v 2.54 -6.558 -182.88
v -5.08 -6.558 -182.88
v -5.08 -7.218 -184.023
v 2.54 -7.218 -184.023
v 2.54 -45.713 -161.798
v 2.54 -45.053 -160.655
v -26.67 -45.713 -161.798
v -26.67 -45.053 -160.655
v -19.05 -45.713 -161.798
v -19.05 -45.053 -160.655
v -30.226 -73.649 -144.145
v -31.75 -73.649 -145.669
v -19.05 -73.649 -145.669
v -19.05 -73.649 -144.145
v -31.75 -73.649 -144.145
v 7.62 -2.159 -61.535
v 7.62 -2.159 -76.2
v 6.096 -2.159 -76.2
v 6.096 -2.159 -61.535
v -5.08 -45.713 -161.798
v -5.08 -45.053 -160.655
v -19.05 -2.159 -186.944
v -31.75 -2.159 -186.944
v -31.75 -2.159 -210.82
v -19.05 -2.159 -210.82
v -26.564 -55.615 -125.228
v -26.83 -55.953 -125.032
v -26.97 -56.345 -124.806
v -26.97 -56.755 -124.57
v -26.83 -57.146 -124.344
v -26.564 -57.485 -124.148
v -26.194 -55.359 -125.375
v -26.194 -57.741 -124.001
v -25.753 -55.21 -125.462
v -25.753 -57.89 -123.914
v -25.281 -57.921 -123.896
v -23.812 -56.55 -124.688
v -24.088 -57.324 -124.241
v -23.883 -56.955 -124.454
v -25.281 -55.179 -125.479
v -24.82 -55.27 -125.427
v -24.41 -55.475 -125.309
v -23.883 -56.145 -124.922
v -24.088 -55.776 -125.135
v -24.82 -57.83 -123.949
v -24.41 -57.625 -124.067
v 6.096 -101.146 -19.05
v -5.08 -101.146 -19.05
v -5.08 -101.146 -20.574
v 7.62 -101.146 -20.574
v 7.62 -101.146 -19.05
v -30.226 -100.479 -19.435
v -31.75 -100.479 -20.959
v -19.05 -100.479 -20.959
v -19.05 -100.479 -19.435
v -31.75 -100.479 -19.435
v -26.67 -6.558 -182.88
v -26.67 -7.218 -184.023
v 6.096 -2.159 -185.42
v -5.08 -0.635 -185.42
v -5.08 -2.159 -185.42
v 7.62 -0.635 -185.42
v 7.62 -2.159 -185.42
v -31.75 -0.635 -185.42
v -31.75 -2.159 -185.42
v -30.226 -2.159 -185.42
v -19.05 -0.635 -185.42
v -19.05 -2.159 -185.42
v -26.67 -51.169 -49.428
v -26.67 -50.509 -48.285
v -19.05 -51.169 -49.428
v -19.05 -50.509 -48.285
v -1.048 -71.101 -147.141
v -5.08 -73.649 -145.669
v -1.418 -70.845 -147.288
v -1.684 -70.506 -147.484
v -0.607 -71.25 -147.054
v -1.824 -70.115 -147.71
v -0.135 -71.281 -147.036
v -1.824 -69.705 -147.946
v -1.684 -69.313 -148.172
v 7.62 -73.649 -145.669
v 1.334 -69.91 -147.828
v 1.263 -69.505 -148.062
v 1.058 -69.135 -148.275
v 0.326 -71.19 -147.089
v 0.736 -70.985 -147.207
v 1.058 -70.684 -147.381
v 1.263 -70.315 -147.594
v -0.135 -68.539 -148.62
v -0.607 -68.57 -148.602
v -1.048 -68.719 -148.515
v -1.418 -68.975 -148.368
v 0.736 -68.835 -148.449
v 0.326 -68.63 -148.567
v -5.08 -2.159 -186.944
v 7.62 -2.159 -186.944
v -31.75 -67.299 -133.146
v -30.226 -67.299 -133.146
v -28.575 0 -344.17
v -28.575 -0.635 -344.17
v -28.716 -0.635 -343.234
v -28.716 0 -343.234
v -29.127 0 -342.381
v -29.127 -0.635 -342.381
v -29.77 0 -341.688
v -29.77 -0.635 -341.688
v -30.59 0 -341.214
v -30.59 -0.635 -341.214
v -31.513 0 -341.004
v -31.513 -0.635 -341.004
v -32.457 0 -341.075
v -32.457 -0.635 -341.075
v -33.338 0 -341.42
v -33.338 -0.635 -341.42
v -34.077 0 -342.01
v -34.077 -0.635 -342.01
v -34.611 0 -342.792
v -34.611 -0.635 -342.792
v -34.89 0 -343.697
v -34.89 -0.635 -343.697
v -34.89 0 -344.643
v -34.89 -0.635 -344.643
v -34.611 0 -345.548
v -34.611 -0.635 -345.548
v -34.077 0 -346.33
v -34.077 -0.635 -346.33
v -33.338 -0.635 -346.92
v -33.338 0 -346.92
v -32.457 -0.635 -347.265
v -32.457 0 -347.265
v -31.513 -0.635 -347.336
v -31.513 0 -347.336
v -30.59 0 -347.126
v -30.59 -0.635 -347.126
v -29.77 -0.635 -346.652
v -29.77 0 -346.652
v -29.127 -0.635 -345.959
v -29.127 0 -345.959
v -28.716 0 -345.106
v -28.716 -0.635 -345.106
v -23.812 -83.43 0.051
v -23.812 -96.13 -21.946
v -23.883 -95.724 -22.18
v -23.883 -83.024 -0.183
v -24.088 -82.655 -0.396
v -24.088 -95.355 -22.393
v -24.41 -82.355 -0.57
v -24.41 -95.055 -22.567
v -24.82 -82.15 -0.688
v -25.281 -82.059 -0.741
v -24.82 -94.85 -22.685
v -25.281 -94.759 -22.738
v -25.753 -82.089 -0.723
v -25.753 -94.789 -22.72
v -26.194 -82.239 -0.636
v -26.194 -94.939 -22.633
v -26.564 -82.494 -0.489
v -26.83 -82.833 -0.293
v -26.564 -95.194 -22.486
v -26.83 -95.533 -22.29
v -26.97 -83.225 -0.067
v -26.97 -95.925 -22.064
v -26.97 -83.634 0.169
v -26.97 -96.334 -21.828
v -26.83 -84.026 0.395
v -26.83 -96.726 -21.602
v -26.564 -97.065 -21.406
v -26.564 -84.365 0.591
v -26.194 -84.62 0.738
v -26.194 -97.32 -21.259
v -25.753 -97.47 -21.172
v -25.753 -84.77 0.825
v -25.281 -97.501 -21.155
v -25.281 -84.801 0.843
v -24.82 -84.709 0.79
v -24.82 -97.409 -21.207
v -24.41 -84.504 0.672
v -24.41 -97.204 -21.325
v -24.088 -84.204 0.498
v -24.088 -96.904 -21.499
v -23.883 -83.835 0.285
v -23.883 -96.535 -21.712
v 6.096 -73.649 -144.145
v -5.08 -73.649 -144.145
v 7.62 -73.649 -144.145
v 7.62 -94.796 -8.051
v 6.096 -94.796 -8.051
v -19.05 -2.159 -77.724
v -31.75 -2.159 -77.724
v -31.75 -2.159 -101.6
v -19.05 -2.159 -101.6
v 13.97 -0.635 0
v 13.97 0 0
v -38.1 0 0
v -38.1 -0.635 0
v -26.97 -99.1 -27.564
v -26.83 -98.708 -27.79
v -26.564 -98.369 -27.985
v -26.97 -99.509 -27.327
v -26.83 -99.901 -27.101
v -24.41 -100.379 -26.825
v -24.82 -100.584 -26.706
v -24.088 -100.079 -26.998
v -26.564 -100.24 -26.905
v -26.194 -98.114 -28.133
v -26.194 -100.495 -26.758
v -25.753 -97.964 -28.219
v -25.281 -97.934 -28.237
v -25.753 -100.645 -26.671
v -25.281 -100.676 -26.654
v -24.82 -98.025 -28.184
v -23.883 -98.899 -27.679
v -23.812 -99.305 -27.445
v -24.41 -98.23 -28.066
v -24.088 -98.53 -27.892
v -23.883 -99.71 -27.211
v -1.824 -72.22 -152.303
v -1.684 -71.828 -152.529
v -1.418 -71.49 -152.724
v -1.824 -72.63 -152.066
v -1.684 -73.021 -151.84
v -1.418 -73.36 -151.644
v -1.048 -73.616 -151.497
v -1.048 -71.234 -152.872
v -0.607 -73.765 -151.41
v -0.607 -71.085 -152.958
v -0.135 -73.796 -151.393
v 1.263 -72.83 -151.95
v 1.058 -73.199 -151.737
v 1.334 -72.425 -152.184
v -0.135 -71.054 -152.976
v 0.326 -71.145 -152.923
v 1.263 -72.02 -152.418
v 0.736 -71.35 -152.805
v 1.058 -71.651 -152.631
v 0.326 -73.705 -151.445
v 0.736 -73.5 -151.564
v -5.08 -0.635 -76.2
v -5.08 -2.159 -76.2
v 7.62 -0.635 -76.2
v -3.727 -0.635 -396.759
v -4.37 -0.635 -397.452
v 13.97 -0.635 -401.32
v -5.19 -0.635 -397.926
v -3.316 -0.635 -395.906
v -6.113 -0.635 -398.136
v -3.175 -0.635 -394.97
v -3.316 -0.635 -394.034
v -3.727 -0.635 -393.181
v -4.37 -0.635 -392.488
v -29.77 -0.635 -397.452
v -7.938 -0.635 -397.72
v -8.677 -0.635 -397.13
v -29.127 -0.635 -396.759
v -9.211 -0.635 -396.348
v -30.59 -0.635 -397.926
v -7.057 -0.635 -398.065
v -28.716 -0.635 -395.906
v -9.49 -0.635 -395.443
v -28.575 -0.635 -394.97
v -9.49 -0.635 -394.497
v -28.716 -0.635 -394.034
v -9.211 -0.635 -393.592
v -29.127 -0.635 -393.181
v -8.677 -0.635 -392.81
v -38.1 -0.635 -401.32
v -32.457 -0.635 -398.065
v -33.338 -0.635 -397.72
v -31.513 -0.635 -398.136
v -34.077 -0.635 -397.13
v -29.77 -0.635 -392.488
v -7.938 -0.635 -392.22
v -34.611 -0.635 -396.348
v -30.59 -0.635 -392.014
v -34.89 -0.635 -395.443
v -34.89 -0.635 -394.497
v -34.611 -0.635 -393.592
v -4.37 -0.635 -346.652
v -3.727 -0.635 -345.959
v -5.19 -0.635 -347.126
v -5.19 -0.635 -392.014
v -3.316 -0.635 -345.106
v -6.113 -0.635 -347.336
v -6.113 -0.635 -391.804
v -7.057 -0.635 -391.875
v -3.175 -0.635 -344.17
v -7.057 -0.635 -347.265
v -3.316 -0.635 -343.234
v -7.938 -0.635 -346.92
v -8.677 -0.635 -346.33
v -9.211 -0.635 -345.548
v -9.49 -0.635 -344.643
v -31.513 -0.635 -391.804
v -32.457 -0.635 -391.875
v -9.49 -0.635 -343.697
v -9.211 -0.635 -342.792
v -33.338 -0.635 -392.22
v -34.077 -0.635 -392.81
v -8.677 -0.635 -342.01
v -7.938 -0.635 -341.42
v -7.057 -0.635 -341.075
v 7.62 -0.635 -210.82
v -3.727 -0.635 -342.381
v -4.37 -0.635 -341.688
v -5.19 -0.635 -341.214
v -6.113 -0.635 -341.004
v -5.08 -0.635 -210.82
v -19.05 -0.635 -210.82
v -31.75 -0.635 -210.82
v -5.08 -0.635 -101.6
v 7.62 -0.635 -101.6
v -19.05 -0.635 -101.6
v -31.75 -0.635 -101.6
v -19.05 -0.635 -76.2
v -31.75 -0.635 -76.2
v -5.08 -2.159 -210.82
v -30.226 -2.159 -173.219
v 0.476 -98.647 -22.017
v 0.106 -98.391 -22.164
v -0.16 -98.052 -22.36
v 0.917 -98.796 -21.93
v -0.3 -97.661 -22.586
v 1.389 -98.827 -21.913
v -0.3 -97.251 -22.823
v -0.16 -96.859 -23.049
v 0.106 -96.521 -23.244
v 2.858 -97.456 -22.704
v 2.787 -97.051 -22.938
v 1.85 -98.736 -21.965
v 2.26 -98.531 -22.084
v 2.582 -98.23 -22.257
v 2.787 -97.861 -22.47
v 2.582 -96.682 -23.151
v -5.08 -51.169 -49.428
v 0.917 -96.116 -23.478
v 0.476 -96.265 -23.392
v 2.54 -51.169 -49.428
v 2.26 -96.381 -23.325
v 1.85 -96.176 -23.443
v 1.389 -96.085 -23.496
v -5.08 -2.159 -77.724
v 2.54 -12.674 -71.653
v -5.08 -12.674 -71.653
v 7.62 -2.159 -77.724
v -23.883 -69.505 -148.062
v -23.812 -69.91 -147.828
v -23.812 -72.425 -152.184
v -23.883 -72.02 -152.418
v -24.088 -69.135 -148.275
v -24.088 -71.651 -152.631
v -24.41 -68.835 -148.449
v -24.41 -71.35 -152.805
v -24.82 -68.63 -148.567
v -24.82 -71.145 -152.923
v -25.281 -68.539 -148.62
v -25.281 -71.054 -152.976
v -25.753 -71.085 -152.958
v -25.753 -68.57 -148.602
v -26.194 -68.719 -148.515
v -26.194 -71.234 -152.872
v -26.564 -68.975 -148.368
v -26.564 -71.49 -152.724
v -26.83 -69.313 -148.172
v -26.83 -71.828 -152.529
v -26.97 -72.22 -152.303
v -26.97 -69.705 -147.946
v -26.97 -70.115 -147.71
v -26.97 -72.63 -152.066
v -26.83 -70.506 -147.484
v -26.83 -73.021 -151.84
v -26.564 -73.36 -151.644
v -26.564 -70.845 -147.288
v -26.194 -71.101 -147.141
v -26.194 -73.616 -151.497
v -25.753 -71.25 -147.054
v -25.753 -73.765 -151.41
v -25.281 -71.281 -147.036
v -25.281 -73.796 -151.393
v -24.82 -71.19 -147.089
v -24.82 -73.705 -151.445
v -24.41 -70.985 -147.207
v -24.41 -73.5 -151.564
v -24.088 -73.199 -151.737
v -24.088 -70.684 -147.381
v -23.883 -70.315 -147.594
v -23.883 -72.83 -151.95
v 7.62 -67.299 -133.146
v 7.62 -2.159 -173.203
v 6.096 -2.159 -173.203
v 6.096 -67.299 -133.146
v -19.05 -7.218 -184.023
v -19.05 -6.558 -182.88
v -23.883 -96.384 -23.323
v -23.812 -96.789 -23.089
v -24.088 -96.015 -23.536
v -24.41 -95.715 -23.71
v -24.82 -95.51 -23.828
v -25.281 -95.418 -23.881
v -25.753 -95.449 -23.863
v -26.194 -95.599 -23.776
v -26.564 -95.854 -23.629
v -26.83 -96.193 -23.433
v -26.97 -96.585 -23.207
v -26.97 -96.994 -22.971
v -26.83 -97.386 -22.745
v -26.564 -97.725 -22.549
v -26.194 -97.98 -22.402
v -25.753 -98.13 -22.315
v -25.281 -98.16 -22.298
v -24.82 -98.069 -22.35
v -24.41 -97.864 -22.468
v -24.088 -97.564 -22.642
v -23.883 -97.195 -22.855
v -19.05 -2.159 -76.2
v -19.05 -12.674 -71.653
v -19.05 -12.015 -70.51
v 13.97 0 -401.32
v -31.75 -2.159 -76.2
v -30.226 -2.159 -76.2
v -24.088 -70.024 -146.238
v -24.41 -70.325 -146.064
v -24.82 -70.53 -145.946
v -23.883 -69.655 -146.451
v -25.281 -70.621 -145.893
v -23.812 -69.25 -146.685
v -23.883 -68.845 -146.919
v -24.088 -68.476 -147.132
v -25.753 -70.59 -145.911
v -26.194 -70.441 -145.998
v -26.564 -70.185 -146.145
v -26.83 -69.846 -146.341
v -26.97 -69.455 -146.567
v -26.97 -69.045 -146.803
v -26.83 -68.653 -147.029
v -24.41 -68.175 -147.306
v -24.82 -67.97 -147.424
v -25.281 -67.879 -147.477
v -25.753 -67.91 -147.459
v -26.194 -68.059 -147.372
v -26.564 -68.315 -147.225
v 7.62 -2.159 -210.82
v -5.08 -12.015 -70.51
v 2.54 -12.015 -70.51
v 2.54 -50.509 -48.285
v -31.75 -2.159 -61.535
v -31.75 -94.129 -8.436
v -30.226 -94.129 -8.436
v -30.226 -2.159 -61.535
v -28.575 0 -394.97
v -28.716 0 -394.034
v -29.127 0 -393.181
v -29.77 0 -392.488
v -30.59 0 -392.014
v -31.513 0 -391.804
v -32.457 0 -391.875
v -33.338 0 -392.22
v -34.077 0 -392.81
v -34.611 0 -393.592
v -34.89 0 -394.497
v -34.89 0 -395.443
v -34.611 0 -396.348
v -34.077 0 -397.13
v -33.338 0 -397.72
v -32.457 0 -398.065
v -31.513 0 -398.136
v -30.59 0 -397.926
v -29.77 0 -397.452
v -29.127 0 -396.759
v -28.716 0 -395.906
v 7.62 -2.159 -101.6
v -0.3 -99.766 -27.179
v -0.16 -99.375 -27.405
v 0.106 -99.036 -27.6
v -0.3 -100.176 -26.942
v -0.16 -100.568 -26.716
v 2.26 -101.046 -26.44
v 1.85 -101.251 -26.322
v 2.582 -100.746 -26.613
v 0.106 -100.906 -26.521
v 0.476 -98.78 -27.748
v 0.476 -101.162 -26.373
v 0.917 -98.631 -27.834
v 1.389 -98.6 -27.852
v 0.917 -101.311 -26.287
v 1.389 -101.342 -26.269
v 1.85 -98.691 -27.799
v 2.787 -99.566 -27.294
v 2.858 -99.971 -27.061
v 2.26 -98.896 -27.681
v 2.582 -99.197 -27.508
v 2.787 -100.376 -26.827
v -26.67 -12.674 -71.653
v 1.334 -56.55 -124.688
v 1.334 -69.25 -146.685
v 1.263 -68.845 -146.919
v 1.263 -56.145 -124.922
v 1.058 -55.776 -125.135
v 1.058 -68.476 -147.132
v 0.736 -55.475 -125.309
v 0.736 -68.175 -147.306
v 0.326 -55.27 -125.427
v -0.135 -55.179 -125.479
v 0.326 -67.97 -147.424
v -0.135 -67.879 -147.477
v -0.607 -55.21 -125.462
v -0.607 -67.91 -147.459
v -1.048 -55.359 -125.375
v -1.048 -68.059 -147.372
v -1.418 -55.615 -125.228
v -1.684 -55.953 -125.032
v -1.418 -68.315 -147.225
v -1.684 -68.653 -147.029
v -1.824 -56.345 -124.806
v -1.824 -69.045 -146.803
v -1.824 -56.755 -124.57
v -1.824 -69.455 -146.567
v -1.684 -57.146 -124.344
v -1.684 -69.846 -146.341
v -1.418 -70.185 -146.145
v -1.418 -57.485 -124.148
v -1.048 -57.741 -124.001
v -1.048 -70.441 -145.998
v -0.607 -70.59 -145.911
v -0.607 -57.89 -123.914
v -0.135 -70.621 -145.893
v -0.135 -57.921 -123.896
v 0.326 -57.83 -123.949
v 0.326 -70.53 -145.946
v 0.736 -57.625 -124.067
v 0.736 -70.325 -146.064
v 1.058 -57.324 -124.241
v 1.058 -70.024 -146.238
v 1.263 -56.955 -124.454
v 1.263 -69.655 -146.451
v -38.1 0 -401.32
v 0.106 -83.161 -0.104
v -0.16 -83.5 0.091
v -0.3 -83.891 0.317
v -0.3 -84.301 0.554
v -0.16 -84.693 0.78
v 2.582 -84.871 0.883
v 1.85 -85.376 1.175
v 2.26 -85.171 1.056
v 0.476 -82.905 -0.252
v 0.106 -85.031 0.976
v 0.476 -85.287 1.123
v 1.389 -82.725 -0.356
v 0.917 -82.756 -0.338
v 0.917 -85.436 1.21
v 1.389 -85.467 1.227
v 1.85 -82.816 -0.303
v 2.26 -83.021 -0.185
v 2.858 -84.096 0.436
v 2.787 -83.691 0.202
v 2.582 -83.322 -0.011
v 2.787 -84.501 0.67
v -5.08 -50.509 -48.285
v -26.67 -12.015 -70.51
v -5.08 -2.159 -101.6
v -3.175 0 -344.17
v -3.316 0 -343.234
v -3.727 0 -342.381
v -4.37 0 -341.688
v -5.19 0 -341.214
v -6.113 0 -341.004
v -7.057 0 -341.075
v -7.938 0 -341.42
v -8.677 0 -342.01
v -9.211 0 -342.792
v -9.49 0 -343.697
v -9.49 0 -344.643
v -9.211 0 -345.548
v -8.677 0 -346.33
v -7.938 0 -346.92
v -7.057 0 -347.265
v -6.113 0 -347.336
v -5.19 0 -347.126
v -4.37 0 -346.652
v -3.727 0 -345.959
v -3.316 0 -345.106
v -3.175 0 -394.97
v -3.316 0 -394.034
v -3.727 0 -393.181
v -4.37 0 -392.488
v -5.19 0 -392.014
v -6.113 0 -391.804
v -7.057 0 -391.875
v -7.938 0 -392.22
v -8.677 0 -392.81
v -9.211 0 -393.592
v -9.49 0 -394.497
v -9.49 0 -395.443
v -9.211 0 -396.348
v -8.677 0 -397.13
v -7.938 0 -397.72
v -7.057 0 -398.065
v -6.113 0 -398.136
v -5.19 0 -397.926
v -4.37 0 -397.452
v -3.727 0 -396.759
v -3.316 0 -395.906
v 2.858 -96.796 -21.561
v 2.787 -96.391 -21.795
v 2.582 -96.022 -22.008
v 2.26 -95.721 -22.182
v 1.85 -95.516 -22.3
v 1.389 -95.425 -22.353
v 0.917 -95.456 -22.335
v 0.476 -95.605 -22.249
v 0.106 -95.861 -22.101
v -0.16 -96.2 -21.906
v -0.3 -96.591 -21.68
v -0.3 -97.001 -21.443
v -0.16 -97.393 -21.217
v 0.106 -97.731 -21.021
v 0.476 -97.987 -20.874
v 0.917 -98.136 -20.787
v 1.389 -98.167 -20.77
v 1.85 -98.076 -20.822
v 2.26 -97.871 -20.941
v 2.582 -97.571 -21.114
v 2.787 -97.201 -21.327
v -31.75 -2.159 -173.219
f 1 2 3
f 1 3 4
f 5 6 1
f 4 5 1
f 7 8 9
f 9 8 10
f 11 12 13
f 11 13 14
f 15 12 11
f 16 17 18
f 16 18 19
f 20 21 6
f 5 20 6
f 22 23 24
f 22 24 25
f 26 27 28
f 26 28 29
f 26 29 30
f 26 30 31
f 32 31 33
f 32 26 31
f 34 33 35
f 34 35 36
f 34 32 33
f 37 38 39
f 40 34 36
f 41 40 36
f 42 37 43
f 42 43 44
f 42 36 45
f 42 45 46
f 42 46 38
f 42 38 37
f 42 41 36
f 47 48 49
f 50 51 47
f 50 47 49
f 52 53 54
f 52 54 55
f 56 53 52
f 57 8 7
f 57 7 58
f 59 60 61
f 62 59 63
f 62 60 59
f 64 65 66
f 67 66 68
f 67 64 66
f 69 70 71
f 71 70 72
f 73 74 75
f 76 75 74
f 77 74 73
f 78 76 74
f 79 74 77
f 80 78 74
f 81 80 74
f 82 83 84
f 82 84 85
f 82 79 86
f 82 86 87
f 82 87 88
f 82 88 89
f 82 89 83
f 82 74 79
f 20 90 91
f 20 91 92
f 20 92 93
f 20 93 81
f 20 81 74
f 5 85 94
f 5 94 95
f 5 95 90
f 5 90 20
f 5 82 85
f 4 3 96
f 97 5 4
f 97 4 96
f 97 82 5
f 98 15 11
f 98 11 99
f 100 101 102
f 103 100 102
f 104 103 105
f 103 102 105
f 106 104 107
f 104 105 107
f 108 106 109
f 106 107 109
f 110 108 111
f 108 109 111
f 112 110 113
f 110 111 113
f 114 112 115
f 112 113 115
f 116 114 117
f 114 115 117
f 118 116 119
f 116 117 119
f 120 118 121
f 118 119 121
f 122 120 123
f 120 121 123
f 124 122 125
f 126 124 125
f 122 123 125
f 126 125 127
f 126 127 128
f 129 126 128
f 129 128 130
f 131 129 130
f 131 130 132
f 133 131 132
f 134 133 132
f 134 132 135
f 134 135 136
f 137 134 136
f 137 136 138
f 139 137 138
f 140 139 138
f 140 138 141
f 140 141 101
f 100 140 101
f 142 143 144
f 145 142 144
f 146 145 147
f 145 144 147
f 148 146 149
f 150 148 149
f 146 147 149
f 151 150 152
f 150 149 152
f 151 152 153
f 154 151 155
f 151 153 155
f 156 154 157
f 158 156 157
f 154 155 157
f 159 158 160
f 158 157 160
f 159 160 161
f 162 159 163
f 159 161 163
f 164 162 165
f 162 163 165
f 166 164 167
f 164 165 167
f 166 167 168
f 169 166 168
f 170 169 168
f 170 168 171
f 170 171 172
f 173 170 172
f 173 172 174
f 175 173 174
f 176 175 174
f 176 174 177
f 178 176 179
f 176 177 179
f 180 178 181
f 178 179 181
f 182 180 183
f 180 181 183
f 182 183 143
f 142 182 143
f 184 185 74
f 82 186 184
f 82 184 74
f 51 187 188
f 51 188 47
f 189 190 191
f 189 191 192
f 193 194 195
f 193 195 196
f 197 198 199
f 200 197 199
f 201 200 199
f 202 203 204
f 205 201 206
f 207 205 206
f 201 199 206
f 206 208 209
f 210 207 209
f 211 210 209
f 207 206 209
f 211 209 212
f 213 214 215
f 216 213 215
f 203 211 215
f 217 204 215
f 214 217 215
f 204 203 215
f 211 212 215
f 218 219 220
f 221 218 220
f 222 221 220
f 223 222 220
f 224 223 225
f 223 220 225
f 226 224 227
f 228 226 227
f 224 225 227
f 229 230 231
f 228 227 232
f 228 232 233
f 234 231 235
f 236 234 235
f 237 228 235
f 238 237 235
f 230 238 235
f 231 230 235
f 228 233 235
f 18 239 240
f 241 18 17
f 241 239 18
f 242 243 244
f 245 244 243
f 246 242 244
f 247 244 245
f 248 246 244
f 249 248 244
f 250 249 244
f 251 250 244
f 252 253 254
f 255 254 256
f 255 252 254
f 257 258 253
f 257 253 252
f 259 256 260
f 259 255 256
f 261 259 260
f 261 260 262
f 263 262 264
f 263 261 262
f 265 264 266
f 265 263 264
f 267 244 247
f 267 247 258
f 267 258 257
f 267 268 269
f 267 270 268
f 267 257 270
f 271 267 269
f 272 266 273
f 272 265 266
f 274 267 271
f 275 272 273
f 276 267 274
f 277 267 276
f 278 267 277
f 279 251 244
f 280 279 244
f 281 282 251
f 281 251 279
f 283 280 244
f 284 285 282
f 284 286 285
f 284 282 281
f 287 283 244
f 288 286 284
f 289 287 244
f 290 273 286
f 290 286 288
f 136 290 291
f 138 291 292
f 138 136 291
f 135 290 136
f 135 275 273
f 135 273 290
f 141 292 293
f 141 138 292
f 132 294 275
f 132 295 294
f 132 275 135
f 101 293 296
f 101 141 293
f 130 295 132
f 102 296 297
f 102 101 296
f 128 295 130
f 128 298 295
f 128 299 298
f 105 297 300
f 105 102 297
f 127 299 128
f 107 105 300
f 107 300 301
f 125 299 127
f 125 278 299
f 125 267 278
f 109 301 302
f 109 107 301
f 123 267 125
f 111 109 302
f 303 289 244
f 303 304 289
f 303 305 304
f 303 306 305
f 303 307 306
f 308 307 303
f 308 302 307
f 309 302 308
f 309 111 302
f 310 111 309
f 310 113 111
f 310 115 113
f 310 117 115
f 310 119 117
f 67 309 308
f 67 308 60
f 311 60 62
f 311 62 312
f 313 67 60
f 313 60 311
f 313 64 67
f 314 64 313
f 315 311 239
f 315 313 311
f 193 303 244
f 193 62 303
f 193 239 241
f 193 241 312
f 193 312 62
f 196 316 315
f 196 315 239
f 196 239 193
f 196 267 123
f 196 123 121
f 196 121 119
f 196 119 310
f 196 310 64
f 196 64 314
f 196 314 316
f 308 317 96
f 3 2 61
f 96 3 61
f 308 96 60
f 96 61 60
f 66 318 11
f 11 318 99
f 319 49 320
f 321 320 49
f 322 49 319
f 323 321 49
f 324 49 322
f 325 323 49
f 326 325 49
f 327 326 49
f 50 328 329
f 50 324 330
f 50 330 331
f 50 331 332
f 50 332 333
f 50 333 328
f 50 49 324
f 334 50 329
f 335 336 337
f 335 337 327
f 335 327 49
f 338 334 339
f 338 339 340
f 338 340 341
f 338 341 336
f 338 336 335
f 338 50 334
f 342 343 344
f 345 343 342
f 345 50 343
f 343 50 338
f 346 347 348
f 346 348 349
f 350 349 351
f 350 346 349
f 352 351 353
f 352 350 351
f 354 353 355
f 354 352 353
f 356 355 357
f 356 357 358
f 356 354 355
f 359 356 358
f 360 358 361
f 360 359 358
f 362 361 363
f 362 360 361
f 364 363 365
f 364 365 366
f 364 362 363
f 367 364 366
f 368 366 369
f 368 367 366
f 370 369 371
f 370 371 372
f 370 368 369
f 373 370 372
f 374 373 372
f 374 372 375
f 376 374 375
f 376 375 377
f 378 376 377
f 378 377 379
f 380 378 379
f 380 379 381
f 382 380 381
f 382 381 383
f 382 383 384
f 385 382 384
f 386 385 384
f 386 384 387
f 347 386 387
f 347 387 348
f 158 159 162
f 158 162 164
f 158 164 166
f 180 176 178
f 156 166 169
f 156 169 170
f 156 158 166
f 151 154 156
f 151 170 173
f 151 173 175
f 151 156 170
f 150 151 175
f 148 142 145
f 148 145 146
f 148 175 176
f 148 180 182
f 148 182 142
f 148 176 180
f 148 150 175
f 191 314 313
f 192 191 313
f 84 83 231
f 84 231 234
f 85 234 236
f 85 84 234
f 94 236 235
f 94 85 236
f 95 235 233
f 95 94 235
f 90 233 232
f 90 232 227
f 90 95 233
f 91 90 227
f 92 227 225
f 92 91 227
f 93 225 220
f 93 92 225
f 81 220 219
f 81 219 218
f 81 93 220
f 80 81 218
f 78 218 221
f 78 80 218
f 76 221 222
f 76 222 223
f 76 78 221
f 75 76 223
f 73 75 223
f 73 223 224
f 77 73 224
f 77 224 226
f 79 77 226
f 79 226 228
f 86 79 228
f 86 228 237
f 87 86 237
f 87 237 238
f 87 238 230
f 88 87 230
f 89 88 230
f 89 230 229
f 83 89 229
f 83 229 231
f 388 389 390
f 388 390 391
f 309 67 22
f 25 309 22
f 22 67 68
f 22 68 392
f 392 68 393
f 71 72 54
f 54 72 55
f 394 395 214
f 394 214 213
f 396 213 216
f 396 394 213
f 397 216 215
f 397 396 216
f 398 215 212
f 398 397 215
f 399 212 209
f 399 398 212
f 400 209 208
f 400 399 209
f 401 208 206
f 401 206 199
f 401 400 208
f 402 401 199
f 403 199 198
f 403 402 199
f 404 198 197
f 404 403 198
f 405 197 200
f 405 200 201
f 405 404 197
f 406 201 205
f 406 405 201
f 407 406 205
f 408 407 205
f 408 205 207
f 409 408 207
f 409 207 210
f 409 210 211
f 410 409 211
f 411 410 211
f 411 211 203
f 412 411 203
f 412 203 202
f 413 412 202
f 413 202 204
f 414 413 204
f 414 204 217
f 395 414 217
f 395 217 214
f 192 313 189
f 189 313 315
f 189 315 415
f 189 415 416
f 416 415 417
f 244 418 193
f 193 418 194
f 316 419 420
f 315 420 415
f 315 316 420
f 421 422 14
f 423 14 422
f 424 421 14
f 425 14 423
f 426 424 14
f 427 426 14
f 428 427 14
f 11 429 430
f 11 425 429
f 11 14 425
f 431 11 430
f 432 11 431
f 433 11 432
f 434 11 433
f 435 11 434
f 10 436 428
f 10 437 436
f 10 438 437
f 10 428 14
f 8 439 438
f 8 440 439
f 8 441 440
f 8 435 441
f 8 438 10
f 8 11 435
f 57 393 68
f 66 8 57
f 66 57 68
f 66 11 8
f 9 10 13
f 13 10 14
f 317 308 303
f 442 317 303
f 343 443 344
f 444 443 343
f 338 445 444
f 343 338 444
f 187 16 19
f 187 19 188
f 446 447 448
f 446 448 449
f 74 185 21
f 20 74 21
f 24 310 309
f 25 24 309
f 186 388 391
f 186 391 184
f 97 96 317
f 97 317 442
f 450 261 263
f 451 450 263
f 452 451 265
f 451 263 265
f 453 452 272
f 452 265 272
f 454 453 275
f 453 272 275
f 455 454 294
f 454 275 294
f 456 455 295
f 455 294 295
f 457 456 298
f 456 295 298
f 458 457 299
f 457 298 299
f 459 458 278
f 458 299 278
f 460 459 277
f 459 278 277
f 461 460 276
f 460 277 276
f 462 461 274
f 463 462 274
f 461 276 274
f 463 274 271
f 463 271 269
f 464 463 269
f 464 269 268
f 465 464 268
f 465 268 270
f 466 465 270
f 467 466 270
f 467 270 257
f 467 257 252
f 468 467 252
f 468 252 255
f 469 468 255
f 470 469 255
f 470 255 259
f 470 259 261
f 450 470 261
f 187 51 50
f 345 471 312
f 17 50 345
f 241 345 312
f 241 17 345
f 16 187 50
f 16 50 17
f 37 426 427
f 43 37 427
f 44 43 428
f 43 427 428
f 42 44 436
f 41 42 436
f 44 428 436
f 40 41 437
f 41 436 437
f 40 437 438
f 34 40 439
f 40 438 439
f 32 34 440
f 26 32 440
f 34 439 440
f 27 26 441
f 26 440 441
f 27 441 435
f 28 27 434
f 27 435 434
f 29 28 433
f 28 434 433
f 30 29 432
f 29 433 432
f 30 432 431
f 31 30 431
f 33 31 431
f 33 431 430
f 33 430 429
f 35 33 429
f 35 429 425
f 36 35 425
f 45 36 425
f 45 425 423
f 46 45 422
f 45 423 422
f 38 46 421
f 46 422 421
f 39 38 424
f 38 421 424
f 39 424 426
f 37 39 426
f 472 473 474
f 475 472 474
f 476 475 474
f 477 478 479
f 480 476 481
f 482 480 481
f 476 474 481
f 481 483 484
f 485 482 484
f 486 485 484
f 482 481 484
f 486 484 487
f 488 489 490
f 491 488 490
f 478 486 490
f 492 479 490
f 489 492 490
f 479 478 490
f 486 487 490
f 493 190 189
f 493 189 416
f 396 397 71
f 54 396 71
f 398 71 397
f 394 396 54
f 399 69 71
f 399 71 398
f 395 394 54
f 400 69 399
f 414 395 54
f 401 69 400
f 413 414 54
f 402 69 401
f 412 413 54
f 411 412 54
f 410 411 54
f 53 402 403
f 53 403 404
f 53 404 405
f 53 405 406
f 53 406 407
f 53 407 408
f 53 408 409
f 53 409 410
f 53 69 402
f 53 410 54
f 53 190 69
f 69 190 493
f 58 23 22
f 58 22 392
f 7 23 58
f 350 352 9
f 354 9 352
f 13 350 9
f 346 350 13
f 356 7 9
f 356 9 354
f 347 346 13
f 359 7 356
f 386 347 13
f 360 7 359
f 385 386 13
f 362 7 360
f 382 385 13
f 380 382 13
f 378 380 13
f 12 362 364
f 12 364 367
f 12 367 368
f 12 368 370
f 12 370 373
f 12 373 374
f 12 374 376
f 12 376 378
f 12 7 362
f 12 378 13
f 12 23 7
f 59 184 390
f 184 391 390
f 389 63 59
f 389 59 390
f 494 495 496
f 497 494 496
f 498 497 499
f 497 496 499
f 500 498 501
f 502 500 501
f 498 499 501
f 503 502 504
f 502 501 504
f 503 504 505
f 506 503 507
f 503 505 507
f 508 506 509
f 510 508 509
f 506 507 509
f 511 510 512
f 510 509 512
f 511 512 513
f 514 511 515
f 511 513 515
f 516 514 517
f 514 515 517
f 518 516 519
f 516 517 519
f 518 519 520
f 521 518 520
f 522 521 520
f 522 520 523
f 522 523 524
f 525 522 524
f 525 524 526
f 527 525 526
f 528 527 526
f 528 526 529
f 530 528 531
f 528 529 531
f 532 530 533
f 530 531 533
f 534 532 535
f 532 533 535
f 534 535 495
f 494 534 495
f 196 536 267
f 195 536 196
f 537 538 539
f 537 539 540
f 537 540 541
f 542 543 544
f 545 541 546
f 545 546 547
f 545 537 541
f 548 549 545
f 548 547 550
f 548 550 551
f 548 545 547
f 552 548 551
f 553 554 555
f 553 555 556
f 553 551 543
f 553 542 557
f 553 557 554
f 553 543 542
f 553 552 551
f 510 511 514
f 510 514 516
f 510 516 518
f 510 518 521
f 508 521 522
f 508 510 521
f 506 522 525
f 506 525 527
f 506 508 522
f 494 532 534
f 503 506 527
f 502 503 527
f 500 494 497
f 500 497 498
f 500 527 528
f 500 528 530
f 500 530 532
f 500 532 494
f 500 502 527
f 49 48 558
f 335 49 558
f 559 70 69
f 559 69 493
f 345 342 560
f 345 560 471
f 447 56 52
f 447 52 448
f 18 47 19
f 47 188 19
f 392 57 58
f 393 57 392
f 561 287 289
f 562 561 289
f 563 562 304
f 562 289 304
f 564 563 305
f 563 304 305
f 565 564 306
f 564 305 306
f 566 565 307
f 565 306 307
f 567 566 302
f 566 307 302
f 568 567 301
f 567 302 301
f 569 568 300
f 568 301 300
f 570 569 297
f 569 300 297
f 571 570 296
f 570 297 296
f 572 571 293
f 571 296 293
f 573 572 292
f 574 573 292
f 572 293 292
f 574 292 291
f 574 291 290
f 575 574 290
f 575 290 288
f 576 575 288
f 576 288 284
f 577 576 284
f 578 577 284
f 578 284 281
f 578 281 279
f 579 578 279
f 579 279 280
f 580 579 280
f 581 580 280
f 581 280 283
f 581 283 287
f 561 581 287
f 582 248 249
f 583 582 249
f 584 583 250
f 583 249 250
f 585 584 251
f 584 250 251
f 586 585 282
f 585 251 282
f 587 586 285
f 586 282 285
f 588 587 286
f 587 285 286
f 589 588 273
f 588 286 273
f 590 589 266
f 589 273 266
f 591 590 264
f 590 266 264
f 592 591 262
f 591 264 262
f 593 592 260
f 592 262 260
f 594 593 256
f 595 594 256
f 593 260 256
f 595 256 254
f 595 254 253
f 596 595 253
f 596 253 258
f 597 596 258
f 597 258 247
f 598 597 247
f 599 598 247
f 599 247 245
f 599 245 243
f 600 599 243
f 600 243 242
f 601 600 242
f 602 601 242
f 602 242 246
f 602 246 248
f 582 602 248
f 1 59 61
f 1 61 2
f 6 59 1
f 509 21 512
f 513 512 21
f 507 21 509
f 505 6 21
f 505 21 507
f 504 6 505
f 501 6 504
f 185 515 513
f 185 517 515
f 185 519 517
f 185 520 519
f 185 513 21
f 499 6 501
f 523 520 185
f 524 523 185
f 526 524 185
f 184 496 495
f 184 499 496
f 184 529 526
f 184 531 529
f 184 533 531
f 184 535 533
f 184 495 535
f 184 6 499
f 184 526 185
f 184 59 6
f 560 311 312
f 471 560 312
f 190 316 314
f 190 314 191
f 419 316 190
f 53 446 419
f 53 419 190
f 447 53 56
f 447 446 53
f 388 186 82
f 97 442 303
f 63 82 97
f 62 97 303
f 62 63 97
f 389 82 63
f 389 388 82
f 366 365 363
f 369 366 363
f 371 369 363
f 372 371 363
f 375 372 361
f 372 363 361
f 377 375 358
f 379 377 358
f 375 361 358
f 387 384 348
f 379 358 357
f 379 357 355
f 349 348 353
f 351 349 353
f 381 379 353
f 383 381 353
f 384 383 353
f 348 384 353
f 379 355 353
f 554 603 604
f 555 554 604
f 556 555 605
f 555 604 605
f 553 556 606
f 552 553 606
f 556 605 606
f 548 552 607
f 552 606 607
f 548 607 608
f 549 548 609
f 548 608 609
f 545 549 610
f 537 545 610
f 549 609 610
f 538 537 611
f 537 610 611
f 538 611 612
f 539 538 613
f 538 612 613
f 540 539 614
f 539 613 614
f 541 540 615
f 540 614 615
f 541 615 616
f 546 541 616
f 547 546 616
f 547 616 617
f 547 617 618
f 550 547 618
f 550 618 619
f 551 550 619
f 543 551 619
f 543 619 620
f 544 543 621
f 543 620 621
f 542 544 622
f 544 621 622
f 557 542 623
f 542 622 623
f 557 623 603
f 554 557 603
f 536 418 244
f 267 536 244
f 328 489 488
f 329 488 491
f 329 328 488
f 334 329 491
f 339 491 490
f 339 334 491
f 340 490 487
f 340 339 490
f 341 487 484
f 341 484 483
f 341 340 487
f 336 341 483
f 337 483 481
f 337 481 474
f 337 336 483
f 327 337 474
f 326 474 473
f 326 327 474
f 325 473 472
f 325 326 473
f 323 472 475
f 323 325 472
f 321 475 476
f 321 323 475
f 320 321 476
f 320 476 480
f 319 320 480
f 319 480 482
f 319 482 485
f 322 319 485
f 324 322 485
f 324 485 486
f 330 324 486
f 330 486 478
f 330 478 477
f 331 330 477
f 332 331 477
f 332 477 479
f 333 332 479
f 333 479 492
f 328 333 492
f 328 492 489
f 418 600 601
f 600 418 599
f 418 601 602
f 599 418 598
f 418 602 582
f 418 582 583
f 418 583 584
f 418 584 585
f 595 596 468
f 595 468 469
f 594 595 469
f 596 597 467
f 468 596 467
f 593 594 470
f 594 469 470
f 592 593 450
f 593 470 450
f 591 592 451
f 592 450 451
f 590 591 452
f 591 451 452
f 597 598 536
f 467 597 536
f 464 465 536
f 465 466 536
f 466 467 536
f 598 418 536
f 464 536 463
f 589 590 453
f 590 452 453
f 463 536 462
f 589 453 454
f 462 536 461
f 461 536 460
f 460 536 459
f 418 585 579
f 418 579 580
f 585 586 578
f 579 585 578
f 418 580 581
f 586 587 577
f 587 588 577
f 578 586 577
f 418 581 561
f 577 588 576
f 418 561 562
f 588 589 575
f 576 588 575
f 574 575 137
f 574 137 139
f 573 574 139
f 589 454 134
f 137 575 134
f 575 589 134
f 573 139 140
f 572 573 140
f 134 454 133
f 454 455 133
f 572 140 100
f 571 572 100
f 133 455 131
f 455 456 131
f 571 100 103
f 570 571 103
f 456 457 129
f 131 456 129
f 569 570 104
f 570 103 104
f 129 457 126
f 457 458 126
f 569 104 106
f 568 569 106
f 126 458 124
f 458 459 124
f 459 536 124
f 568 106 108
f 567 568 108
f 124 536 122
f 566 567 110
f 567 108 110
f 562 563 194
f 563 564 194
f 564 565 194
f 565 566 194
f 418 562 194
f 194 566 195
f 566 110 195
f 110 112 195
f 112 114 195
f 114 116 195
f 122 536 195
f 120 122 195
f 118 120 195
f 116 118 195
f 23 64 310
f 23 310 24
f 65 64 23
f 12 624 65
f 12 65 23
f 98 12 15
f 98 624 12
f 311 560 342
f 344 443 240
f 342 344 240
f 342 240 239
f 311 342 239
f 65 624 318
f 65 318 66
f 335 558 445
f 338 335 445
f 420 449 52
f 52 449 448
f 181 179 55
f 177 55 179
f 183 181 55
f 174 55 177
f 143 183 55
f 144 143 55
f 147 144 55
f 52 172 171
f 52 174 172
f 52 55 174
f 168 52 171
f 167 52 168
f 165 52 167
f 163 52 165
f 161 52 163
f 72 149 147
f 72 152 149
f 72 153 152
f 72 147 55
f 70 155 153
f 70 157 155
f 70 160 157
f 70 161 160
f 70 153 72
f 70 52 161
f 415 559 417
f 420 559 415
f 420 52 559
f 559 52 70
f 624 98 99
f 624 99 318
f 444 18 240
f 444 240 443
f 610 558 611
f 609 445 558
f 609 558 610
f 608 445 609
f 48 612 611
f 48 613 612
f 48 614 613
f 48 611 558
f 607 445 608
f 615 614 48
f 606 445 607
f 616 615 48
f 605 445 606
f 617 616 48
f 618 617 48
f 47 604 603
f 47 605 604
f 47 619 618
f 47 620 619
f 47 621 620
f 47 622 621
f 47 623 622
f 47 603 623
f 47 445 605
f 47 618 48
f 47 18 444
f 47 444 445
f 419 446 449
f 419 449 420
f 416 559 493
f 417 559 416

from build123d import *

# Parameters (mm, degrees)
F0_W           = 38.1
F0_H           = 401.32
F1_DEPTH       = 0.635
F2_DEPTH       = 13.97
F3_W           = 12.7
F3_H           = 25.4
F4_DEPTH       = 1.524
F5_W           = 12.7
F5_H           = 25.4
F6_DEPTH       = 1.524
F8_DEPTH       = 12.7
F10_DEPTH      = 12.7
F12_DEPTH      = 1.524
F14_DEPTH      = 1.524
F15_W          = 7.62
F15_H          = 44.45
F16_DEPTH      = 25.4
F17_W          = 12.7
F17_H          = 25.4
F18_DEPTH      = 1.524
F20_DEPTH      = 12.7
F22_DEPTH      = 12.7
F24_DEPTH      = 1.524
F26_DEPTH      = 1.524
F27_W          = 7.62
F27_H          = 44.45
F28_DEPTH      = 25.4
F29_R          = 3.175
F30_DEPTH      = 25.4
F31_R          = 1.5875
F32_DEPTH      = 25.4
F32_DEPTH_BACK = 6.35
F33_R          = 1.5875
F34_DEPTH      = 25.4
F34_DEPTH_BACK = 6.35


with BuildPart() as f1:
    # F0 (on Front) → F1 (new body)
    with BuildSketch(Plane.XZ):
        with Locations((-19.05, -200.66)):
            Rectangle(F0_W, F0_H)
    extrude(amount=F1_DEPTH)

    # F2 (add): a face of the model
    f2_faces = [f1.faces().sort_by_distance(p)[0] for p in [
        (0, -0.3175, -200.66),
    ]]
    extrude(f2_faces, amount=F2_DEPTH)

    # F3 (on face) → F4 (join)
    with BuildSketch(Plane.XZ.offset(0.635)):
        with Locations((1.27, -88.9)):
            Rectangle(F3_W, F3_H)
    extrude(amount=F4_DEPTH)

    # F5 (on face) → F6 (join)
    with BuildSketch(Plane.XZ.offset(0.635)):
        with Locations((-25.4, -88.9)):
            Rectangle(F5_W, F5_H)
    extrude(amount=F6_DEPTH)

    # F7 (on face) → F8 (join)
    with BuildSketch(Plane.YZ.offset(7.62)):
        Polygon((-2.159, -77.724), (-2.159, -76.2), (-101.1457036526, -19.05), (-101.1457036526, -20.574), align=None)
    extrude(amount=-F8_DEPTH)

    # F9 (on face) → F10 (join)
    with BuildSketch(Plane(origin=(-31.75, 0, 0), x_dir=(0, -1, 0), z_dir=(-1, 0, 0))):
        Polygon((100.4791929613, -19.434810127), (2.159, -76.2), (2.159, -77.724), (100.4791929613, -20.958810127), align=None)
    extrude(amount=-F10_DEPTH)

    # F11 (on face) → F12 (join)
    with BuildSketch(Plane.YZ.offset(7.62)):
        Polygon((-101.1457036526, -19.05), (-2.159, -76.2), (-2.159, -61.5353031626), (-94.7957036526, -8.0514773719), align=None)
    extrude(amount=-F12_DEPTH)

    # F13 (on face) → F14 (join)
    with BuildSketch(Plane(origin=(-31.75, 0, 0), x_dir=(0, -1, 0), z_dir=(-1, 0, 0))):
        Polygon((2.159, -61.5353031626), (2.159, -76.2), (100.4791929613, -19.434810127), (94.1291929613, -8.4362874989), align=None)
    extrude(amount=-F14_DEPTH)

    # F15 (on face) → F16 (cut)
    with BuildSketch(Plane(origin=(0, -33.5353178842, -58.0848744234), x_dir=(1, 0, 0), z_dir=(0, 0.5, 0.8660254038))):
        with Locations((-22.86, 2.6250738686)):
            Rectangle(F15_W, F15_H)
        with Locations((-1.27, 2.6250738686)):
            Rectangle(F15_W, F15_H)
    extrude(amount=-F16_DEPTH, mode=Mode.SUBTRACT)

    # F17 (on face) → F18 (join)
    with BuildSketch(Plane.XZ.offset(0.635)):
        with Locations((-25.4, -198.12)):
            Rectangle(F17_W, F17_H)
        with Locations((1.27, -198.12)):
            Rectangle(F17_W, F17_H)
    extrude(amount=F18_DEPTH)

    # F19 (on face) → F20 (join)
    with BuildSketch(Plane.YZ.offset(7.62)):
        Polygon((-2.159, -186.944), (-2.159, -185.42), (-73.6493970824, -144.145), (-73.6493970824, -145.669), align=None)
    extrude(amount=-F20_DEPTH)

    # F21 (on face) → F22 (join)
    with BuildSketch(Plane(origin=(-31.75, 0, 0), x_dir=(0, -1, 0), z_dir=(-1, 0, 0))):
        Polygon((73.6493970824, -144.145), (2.159, -185.42), (2.159, -186.944), (73.6493970824, -145.669), align=None)
    extrude(amount=-F22_DEPTH)

    # F23 (on face) → F24 (join)
    with BuildSketch(Plane.YZ.offset(7.62)):
        Polygon((-73.6493970824, -144.145), (-2.159, -185.42), (-2.159, -173.2028803778), (-67.2993970824, -133.1464773719), align=None)
    extrude(amount=-F24_DEPTH)

    # F25 (on face) → F26 (join)
    with BuildSketch(Plane(origin=(-31.75, 0, 0), x_dir=(0, -1, 0), z_dir=(-1, 0, 0))):
        Polygon((2.159, -173.2192523234), (2.159, -185.42), (73.6493970824, -144.145), (67.2993970824, -133.1464773719), align=None)
    extrude(amount=-F26_DEPTH)

    # F27 (on face) → F28 (cut)
    with BuildSketch(Plane(origin=(0, -80.8289651849, -139.9998744234), x_dir=(1, 0, 0), z_dir=(0, 0.5, 0.8660254038))):
        with Locations((-22.86, 63.5352511532)):
            Rectangle(F27_W, F27_H)
        with Locations((-1.27, 63.5352511532)):
            Rectangle(F27_W, F27_H)
    extrude(amount=-F28_DEPTH, mode=Mode.SUBTRACT)

    # F29 (on face) → F30 (cut)
    with BuildSketch(Plane.XZ.offset(0.635)):
        with Locations((-31.75, -394.97)):
            Circle(F29_R)
        with Locations((-31.75, -344.17)):
            Circle(F29_R)
        with Locations((-6.35, -344.17)):
            Circle(F29_R)
        with Locations((-6.35, -394.97)):
            Circle(F29_R)
    extrude(amount=-F30_DEPTH, mode=Mode.SUBTRACT)

    # F31 (on face) → F32 (join, two sides)
    with BuildSketch(Plane(origin=(0, -33.5353178842, -58.0848744234), x_dir=(1, 0, 0), z_dir=(0, 0.5, 0.8660254038))) as f32_sk:
        with Locations((-25.4, -72.2776037297)):
            Circle(F31_R)
        with Locations((1.27, -73.0472239837)):
            Circle(F31_R)
    extrude(amount=F32_DEPTH)
    extrude(f32_sk.sketch, amount=-F32_DEPTH_BACK)

    # F33 (on face) → F34 (join, two sides)
    with BuildSketch(Plane(origin=(0, -80.8289651849, -139.9998744234), x_dir=(1, 0, 0), z_dir=(0, 0.5, 0.8660254038))) as f34_sk:
        with Locations((-25.4, 13.3702511532)):
            Circle(F33_R)
        with Locations((-0.254, 13.3702511532)):
            Circle(F33_R)
    extrude(amount=F34_DEPTH)
    extrude(f34_sk.sketch, amount=-F34_DEPTH_BACK)


solid = f1.part
